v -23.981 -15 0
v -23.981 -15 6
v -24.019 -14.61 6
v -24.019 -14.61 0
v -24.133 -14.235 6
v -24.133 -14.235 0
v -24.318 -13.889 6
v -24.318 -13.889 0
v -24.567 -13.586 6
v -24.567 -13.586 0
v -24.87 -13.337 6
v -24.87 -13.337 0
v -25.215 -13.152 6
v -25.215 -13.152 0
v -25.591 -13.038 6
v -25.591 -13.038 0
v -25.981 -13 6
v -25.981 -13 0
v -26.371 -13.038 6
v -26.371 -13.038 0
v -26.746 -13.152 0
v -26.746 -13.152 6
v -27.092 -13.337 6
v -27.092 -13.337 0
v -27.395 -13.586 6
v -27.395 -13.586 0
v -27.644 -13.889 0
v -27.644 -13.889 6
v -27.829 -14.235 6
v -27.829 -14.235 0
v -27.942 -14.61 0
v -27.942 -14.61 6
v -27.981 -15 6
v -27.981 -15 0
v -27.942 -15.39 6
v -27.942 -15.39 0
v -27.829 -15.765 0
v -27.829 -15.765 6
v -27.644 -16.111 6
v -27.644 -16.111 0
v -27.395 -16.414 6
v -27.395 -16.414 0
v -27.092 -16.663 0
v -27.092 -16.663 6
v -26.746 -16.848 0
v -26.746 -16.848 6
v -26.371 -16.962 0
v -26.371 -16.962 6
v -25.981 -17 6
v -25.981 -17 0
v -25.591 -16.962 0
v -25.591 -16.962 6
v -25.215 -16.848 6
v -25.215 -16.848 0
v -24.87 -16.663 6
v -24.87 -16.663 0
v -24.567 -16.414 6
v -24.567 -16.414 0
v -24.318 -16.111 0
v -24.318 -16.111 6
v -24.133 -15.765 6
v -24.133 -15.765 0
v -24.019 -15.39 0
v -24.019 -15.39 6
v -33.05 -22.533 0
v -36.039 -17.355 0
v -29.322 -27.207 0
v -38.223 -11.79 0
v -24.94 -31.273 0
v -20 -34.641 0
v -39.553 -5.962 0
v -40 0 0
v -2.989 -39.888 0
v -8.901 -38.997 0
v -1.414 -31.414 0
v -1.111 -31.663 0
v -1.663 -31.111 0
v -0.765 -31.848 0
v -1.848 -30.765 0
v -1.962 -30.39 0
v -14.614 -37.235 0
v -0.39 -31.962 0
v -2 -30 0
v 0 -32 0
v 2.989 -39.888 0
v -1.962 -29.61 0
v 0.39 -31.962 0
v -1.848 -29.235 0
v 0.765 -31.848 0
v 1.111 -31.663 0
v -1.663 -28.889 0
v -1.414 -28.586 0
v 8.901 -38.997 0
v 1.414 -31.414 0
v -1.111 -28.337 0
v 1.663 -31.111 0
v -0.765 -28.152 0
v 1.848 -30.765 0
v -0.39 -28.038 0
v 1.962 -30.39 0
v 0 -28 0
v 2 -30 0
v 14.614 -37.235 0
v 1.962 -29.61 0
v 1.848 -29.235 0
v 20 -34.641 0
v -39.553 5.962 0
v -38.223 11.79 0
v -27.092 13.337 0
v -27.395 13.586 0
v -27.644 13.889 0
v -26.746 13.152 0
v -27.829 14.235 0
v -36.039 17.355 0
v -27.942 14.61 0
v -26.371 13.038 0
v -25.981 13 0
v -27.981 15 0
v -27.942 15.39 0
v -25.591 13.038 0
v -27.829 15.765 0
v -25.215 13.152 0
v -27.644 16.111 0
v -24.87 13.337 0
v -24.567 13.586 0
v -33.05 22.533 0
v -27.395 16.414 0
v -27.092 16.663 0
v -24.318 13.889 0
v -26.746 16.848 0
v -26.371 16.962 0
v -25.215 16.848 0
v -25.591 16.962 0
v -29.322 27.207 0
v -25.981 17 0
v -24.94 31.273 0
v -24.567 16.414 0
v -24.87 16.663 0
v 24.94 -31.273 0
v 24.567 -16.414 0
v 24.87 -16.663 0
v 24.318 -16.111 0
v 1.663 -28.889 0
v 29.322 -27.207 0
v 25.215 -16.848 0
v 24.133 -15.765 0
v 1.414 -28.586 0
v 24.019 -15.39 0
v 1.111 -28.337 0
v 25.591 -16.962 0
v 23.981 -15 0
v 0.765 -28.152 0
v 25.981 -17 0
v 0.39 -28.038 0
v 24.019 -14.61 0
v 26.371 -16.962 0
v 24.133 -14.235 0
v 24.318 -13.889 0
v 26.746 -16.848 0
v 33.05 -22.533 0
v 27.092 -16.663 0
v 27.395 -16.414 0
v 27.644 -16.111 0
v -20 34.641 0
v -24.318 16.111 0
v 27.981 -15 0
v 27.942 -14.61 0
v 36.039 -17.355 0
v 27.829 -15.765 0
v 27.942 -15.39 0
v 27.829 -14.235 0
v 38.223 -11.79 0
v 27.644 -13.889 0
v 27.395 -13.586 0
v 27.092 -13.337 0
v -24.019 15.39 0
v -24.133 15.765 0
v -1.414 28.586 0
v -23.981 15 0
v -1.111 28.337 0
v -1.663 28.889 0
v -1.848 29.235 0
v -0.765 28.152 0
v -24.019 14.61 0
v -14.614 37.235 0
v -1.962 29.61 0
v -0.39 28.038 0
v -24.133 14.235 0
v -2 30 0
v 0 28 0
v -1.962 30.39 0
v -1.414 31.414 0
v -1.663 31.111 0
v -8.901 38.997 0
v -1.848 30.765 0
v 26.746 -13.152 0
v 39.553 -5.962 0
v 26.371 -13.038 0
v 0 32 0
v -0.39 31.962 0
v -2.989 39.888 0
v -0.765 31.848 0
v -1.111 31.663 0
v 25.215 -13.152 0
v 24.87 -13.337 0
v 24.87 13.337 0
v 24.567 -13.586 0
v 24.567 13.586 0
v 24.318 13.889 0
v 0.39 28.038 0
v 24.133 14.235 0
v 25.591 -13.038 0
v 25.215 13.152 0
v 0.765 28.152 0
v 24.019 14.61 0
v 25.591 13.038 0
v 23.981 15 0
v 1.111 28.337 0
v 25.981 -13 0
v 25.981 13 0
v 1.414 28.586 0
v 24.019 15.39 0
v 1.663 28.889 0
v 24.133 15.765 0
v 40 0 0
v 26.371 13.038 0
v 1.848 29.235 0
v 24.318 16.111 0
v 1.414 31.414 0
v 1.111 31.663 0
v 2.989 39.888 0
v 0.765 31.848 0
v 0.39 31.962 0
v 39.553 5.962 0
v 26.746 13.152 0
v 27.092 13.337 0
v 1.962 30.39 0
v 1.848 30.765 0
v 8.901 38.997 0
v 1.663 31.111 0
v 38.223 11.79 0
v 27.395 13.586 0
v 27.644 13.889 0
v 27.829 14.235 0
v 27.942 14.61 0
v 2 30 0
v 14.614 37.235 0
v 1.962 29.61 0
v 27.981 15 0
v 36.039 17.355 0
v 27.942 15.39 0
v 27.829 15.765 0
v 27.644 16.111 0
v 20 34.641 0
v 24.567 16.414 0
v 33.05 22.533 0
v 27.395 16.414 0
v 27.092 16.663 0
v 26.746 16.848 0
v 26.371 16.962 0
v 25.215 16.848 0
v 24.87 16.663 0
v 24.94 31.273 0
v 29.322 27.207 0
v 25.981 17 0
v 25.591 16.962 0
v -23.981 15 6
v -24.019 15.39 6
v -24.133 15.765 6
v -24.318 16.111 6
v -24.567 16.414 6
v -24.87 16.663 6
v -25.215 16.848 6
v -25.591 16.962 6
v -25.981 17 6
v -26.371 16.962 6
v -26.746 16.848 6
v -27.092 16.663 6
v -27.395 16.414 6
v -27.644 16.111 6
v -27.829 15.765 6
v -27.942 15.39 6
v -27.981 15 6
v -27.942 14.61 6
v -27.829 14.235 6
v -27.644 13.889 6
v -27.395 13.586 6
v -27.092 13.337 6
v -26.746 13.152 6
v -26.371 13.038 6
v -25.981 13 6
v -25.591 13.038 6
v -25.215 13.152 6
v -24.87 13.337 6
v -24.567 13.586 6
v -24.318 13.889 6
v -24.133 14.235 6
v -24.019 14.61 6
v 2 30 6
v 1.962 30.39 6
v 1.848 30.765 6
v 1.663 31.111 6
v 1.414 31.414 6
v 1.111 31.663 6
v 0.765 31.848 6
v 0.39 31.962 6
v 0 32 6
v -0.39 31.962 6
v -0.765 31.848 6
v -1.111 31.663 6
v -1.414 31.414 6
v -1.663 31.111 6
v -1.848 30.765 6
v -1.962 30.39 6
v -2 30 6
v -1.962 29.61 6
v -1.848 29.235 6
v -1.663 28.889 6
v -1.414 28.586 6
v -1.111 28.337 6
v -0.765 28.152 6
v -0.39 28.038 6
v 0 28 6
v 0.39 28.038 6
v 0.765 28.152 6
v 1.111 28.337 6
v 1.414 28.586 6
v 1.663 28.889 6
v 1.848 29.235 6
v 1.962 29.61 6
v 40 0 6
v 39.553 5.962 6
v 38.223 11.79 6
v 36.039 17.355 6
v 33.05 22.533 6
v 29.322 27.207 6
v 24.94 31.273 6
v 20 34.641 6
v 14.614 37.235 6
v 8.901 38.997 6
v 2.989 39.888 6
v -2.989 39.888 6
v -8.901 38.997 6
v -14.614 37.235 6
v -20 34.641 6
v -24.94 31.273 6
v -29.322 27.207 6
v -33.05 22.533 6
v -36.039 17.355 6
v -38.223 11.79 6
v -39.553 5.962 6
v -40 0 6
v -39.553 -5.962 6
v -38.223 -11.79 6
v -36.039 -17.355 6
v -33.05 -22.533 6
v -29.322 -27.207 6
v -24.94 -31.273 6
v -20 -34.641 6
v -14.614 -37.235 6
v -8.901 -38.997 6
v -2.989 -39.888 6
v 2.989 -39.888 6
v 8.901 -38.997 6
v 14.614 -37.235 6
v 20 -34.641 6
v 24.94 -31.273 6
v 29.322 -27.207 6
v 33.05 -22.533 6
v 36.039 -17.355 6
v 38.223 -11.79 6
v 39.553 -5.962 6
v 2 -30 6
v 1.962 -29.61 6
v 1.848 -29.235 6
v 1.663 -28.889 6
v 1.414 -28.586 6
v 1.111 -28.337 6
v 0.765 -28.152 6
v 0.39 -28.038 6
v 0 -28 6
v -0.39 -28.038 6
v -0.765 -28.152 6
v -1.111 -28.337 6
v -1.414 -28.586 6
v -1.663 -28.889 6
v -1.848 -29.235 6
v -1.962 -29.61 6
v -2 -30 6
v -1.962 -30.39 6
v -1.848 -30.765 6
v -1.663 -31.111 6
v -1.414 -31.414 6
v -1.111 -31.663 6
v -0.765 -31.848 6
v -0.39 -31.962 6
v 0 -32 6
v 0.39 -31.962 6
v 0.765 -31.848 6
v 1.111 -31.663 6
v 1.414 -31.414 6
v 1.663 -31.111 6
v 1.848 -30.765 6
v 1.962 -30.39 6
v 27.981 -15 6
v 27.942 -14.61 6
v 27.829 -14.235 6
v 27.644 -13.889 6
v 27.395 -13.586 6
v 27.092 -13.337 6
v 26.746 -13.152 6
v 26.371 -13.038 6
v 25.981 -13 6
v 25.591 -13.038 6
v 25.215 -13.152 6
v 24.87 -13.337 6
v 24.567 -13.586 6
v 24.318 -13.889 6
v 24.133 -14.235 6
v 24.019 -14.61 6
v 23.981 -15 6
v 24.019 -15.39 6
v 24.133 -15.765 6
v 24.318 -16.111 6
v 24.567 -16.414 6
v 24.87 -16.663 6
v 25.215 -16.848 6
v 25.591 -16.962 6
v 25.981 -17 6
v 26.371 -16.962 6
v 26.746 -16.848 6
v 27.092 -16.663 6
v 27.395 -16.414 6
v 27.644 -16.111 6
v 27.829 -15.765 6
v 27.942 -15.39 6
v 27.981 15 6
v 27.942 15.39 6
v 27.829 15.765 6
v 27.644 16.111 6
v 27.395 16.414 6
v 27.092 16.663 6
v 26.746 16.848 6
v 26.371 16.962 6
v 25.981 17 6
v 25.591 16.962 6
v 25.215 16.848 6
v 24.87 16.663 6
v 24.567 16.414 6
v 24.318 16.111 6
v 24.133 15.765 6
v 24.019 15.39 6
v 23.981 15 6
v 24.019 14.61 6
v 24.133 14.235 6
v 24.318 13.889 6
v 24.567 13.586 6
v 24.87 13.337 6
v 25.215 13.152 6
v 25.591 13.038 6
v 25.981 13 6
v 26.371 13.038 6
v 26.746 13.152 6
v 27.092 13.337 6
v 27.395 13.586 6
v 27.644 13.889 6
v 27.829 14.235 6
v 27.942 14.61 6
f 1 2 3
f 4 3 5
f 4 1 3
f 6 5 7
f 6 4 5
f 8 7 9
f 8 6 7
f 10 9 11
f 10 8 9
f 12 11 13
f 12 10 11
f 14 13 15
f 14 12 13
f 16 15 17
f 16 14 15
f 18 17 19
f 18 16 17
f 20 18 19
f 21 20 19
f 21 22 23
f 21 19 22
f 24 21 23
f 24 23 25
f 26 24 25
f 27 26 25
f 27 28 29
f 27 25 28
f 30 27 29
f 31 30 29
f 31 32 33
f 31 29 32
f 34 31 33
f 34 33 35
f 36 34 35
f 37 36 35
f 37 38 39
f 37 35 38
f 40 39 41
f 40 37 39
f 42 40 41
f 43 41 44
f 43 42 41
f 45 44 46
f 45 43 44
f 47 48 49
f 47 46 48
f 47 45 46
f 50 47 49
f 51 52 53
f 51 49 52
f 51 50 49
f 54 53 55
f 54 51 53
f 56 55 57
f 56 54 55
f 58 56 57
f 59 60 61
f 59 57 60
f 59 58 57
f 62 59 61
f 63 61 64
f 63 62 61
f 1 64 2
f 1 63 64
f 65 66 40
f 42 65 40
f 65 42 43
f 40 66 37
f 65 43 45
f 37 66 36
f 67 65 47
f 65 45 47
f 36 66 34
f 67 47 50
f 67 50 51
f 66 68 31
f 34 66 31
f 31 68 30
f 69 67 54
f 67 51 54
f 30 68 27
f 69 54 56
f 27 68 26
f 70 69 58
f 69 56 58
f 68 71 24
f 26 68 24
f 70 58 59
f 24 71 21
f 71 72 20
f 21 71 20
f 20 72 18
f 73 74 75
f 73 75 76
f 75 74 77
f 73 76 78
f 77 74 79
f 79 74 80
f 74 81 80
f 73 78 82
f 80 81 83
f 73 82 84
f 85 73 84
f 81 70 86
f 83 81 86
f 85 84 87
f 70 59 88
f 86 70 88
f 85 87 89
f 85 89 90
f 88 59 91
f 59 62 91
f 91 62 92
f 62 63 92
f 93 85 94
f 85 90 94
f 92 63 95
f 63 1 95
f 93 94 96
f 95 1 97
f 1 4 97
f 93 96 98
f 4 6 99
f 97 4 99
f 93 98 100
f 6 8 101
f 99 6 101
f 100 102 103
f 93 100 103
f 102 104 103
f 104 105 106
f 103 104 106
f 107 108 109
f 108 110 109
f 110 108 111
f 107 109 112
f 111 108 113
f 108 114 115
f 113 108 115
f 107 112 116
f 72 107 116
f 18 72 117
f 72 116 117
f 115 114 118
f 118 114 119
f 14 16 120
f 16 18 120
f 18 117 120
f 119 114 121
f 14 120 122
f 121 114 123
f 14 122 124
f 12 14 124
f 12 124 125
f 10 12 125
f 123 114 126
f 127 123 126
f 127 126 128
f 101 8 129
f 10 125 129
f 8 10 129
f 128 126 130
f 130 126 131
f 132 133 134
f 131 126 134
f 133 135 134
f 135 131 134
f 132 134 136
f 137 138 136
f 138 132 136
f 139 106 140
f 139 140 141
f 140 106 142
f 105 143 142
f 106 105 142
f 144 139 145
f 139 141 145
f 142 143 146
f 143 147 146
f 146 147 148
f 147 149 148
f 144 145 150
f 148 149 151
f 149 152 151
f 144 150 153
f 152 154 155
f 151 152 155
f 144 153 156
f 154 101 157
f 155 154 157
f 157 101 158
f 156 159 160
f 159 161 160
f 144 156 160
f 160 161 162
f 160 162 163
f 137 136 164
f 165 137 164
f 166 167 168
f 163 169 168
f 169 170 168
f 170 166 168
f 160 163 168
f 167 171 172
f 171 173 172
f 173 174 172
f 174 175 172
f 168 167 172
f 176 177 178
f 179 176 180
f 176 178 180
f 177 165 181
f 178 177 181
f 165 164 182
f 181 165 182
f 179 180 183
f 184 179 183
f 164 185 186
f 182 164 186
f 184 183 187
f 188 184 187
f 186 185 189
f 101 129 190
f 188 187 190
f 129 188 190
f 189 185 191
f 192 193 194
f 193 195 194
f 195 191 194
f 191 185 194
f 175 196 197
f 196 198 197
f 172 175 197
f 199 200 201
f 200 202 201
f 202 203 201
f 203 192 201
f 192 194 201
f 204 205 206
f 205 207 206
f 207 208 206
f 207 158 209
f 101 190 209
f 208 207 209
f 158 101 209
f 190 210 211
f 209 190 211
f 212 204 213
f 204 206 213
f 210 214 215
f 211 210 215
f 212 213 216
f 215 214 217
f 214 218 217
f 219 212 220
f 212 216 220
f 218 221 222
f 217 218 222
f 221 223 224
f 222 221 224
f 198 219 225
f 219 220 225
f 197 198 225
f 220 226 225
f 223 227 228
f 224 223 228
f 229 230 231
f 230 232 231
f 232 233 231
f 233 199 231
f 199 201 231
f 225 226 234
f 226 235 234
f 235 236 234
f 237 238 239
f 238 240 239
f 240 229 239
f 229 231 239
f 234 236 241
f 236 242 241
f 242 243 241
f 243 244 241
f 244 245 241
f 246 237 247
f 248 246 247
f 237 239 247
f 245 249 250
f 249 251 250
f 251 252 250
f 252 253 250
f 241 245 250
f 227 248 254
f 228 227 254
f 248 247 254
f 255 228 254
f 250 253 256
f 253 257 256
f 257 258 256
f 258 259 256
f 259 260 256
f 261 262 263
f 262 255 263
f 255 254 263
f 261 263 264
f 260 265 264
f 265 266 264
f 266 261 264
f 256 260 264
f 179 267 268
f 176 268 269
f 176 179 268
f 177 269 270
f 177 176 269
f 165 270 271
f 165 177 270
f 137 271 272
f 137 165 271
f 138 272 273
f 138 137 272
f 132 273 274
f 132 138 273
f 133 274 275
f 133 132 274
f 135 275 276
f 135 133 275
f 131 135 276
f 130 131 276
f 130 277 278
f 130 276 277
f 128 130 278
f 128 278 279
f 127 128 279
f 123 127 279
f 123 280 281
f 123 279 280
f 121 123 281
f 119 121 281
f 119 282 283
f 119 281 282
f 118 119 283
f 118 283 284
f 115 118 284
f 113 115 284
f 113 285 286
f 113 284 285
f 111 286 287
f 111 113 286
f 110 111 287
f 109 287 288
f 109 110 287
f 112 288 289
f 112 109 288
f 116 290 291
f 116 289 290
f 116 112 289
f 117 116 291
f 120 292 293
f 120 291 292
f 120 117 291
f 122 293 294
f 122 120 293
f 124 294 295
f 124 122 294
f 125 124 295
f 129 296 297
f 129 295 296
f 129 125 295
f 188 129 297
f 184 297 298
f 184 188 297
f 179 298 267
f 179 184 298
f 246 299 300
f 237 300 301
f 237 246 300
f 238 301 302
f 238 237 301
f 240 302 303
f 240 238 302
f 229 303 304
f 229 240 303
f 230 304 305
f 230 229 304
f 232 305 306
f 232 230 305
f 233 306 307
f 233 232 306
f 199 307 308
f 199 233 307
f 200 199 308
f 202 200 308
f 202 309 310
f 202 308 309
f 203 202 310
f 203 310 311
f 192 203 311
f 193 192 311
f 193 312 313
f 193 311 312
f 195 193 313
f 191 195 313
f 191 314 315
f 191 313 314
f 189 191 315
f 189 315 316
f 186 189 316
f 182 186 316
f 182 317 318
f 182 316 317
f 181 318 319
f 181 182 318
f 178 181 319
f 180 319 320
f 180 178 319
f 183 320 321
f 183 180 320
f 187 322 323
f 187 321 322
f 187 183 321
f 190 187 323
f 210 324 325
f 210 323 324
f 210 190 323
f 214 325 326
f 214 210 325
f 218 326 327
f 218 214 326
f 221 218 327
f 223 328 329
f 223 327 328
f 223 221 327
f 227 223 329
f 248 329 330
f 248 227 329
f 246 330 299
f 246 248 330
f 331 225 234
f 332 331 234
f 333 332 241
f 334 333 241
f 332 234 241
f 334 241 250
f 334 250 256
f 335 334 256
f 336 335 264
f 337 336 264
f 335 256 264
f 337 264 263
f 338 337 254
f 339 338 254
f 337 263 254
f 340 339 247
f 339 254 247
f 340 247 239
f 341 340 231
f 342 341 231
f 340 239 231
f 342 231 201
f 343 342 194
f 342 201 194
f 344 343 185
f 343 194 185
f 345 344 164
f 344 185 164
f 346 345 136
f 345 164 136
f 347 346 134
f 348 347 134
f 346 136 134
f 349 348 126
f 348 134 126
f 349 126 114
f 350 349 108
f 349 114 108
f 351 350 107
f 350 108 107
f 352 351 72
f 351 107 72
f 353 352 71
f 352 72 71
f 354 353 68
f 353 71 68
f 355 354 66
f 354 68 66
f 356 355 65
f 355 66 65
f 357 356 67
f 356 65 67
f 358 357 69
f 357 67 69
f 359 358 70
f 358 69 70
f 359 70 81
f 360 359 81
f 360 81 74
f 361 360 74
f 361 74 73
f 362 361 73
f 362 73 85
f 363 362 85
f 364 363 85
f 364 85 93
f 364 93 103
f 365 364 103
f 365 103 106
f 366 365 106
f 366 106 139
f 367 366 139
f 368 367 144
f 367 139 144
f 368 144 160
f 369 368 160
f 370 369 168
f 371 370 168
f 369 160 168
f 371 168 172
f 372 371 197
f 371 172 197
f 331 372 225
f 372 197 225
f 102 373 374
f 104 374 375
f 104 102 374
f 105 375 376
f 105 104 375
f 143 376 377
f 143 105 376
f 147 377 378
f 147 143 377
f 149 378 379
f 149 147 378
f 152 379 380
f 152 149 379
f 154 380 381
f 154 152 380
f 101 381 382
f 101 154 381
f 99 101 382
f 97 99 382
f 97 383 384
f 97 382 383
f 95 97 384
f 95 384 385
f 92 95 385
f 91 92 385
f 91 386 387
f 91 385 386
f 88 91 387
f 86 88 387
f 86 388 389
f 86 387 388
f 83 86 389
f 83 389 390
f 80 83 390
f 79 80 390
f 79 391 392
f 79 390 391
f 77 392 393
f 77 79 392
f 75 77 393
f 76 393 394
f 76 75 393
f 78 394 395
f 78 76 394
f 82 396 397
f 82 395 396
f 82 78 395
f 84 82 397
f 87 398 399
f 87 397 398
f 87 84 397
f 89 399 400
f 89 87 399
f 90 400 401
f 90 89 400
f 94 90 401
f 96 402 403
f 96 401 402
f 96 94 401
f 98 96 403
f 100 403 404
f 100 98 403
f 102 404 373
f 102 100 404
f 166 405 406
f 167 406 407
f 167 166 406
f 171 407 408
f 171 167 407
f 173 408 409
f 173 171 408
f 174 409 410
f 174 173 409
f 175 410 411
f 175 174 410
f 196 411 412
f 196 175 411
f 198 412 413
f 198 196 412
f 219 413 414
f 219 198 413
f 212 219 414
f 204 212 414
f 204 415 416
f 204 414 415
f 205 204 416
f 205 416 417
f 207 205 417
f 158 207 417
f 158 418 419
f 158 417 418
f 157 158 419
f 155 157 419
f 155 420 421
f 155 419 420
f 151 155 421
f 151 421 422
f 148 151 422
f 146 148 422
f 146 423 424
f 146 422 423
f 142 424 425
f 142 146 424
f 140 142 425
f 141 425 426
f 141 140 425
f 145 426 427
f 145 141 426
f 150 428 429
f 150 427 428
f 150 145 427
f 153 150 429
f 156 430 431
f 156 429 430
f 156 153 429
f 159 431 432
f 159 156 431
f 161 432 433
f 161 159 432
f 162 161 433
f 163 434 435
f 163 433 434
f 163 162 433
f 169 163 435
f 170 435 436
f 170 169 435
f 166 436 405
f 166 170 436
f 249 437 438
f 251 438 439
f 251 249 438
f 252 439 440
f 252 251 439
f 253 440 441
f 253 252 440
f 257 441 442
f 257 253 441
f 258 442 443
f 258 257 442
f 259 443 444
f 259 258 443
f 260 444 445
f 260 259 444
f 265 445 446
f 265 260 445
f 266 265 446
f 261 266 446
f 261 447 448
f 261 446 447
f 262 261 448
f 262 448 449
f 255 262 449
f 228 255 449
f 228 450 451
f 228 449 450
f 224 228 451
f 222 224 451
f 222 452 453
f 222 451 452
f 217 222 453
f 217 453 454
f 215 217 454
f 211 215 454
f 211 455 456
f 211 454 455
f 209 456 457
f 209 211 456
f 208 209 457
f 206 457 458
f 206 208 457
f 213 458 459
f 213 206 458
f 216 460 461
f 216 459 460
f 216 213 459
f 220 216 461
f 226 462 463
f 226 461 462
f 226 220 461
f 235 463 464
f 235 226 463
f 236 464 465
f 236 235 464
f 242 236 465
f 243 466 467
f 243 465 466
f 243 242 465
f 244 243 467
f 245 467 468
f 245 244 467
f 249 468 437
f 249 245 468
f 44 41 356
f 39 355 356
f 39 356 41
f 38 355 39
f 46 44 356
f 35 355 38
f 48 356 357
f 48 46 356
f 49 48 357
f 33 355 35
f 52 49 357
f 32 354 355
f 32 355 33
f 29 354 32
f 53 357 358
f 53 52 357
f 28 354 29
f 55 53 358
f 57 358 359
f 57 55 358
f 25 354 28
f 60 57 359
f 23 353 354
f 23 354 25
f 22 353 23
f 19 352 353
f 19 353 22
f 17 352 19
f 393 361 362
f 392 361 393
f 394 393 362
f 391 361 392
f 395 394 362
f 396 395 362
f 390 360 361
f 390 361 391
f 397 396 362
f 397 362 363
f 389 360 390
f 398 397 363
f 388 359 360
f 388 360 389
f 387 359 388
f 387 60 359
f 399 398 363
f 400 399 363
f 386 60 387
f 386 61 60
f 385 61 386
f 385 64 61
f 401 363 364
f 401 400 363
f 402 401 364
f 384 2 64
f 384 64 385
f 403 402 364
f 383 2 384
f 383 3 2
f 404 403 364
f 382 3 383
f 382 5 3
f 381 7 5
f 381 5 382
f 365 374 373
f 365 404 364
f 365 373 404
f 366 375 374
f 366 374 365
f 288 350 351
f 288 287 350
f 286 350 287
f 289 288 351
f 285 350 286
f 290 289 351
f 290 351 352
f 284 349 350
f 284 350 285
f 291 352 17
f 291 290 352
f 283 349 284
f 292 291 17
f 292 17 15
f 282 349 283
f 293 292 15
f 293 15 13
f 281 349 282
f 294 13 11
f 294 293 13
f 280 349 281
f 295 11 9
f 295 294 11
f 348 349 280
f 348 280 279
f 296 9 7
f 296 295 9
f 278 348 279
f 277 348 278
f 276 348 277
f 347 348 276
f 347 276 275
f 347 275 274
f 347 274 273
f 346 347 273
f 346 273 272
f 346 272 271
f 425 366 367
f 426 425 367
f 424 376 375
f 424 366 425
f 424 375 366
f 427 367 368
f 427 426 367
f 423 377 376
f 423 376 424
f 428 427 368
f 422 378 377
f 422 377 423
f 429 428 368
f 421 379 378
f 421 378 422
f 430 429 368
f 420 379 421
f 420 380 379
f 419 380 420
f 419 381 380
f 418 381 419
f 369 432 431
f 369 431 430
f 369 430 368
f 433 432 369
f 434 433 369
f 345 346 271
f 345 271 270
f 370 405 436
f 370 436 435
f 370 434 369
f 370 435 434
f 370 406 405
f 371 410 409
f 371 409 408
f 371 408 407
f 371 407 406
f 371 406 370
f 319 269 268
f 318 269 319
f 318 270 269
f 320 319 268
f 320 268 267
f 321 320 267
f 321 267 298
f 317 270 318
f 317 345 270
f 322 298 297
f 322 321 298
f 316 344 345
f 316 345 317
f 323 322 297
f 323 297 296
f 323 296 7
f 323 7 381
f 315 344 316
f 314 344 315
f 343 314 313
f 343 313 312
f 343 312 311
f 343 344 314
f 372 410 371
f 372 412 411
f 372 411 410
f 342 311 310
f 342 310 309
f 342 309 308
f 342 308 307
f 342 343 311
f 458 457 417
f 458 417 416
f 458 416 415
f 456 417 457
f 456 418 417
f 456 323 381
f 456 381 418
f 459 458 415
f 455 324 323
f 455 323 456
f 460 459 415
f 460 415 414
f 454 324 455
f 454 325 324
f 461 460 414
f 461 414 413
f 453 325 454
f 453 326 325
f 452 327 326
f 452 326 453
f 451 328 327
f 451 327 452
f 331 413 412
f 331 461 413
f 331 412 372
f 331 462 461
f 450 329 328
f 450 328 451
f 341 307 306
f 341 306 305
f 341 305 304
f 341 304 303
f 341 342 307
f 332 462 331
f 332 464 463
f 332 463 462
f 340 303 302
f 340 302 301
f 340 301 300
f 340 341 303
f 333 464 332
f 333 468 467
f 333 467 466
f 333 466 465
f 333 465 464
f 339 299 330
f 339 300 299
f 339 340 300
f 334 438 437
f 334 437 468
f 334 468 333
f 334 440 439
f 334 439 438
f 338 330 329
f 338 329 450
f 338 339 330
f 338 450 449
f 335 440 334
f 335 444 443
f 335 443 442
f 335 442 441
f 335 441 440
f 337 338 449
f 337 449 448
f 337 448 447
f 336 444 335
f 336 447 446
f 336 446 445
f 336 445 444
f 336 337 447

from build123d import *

# Parameters (mm, degrees)
SKETCH1_R           = 40
BOSS_EXTRUDE1_DEPTH = 6
SKETCH2_R           = 2
CUT_EXTRUDE1_DEPTH  = 57.885850613


with BuildPart() as part:
    # Sketch1 → Boss-Extrude1 (new body)
    with BuildSketch(Plane.XY):
        Circle(SKETCH1_R)
    extrude(amount=BOSS_EXTRUDE1_DEPTH)

    # Sketch2 → Cut-Extrude1 (cut, through all)
    with BuildSketch(Plane.XY):
        with Locations((0, 30)):
            Circle(SKETCH2_R)
        with Locations((25.980762114, 15)):
            Circle(SKETCH2_R)
        with Locations((25.980762114, -15)):
            Circle(SKETCH2_R)
        with Locations((0, -30)):
            Circle(SKETCH2_R)
        with Locations((-25.980762114, -15)):
            Circle(SKETCH2_R)
        with Locations((-25.980762114, 15)):
            Circle(SKETCH2_R)
    extrude(amount=CUT_EXTRUDE1_DEPTH, mode=Mode.SUBTRACT)


solid = part.part
